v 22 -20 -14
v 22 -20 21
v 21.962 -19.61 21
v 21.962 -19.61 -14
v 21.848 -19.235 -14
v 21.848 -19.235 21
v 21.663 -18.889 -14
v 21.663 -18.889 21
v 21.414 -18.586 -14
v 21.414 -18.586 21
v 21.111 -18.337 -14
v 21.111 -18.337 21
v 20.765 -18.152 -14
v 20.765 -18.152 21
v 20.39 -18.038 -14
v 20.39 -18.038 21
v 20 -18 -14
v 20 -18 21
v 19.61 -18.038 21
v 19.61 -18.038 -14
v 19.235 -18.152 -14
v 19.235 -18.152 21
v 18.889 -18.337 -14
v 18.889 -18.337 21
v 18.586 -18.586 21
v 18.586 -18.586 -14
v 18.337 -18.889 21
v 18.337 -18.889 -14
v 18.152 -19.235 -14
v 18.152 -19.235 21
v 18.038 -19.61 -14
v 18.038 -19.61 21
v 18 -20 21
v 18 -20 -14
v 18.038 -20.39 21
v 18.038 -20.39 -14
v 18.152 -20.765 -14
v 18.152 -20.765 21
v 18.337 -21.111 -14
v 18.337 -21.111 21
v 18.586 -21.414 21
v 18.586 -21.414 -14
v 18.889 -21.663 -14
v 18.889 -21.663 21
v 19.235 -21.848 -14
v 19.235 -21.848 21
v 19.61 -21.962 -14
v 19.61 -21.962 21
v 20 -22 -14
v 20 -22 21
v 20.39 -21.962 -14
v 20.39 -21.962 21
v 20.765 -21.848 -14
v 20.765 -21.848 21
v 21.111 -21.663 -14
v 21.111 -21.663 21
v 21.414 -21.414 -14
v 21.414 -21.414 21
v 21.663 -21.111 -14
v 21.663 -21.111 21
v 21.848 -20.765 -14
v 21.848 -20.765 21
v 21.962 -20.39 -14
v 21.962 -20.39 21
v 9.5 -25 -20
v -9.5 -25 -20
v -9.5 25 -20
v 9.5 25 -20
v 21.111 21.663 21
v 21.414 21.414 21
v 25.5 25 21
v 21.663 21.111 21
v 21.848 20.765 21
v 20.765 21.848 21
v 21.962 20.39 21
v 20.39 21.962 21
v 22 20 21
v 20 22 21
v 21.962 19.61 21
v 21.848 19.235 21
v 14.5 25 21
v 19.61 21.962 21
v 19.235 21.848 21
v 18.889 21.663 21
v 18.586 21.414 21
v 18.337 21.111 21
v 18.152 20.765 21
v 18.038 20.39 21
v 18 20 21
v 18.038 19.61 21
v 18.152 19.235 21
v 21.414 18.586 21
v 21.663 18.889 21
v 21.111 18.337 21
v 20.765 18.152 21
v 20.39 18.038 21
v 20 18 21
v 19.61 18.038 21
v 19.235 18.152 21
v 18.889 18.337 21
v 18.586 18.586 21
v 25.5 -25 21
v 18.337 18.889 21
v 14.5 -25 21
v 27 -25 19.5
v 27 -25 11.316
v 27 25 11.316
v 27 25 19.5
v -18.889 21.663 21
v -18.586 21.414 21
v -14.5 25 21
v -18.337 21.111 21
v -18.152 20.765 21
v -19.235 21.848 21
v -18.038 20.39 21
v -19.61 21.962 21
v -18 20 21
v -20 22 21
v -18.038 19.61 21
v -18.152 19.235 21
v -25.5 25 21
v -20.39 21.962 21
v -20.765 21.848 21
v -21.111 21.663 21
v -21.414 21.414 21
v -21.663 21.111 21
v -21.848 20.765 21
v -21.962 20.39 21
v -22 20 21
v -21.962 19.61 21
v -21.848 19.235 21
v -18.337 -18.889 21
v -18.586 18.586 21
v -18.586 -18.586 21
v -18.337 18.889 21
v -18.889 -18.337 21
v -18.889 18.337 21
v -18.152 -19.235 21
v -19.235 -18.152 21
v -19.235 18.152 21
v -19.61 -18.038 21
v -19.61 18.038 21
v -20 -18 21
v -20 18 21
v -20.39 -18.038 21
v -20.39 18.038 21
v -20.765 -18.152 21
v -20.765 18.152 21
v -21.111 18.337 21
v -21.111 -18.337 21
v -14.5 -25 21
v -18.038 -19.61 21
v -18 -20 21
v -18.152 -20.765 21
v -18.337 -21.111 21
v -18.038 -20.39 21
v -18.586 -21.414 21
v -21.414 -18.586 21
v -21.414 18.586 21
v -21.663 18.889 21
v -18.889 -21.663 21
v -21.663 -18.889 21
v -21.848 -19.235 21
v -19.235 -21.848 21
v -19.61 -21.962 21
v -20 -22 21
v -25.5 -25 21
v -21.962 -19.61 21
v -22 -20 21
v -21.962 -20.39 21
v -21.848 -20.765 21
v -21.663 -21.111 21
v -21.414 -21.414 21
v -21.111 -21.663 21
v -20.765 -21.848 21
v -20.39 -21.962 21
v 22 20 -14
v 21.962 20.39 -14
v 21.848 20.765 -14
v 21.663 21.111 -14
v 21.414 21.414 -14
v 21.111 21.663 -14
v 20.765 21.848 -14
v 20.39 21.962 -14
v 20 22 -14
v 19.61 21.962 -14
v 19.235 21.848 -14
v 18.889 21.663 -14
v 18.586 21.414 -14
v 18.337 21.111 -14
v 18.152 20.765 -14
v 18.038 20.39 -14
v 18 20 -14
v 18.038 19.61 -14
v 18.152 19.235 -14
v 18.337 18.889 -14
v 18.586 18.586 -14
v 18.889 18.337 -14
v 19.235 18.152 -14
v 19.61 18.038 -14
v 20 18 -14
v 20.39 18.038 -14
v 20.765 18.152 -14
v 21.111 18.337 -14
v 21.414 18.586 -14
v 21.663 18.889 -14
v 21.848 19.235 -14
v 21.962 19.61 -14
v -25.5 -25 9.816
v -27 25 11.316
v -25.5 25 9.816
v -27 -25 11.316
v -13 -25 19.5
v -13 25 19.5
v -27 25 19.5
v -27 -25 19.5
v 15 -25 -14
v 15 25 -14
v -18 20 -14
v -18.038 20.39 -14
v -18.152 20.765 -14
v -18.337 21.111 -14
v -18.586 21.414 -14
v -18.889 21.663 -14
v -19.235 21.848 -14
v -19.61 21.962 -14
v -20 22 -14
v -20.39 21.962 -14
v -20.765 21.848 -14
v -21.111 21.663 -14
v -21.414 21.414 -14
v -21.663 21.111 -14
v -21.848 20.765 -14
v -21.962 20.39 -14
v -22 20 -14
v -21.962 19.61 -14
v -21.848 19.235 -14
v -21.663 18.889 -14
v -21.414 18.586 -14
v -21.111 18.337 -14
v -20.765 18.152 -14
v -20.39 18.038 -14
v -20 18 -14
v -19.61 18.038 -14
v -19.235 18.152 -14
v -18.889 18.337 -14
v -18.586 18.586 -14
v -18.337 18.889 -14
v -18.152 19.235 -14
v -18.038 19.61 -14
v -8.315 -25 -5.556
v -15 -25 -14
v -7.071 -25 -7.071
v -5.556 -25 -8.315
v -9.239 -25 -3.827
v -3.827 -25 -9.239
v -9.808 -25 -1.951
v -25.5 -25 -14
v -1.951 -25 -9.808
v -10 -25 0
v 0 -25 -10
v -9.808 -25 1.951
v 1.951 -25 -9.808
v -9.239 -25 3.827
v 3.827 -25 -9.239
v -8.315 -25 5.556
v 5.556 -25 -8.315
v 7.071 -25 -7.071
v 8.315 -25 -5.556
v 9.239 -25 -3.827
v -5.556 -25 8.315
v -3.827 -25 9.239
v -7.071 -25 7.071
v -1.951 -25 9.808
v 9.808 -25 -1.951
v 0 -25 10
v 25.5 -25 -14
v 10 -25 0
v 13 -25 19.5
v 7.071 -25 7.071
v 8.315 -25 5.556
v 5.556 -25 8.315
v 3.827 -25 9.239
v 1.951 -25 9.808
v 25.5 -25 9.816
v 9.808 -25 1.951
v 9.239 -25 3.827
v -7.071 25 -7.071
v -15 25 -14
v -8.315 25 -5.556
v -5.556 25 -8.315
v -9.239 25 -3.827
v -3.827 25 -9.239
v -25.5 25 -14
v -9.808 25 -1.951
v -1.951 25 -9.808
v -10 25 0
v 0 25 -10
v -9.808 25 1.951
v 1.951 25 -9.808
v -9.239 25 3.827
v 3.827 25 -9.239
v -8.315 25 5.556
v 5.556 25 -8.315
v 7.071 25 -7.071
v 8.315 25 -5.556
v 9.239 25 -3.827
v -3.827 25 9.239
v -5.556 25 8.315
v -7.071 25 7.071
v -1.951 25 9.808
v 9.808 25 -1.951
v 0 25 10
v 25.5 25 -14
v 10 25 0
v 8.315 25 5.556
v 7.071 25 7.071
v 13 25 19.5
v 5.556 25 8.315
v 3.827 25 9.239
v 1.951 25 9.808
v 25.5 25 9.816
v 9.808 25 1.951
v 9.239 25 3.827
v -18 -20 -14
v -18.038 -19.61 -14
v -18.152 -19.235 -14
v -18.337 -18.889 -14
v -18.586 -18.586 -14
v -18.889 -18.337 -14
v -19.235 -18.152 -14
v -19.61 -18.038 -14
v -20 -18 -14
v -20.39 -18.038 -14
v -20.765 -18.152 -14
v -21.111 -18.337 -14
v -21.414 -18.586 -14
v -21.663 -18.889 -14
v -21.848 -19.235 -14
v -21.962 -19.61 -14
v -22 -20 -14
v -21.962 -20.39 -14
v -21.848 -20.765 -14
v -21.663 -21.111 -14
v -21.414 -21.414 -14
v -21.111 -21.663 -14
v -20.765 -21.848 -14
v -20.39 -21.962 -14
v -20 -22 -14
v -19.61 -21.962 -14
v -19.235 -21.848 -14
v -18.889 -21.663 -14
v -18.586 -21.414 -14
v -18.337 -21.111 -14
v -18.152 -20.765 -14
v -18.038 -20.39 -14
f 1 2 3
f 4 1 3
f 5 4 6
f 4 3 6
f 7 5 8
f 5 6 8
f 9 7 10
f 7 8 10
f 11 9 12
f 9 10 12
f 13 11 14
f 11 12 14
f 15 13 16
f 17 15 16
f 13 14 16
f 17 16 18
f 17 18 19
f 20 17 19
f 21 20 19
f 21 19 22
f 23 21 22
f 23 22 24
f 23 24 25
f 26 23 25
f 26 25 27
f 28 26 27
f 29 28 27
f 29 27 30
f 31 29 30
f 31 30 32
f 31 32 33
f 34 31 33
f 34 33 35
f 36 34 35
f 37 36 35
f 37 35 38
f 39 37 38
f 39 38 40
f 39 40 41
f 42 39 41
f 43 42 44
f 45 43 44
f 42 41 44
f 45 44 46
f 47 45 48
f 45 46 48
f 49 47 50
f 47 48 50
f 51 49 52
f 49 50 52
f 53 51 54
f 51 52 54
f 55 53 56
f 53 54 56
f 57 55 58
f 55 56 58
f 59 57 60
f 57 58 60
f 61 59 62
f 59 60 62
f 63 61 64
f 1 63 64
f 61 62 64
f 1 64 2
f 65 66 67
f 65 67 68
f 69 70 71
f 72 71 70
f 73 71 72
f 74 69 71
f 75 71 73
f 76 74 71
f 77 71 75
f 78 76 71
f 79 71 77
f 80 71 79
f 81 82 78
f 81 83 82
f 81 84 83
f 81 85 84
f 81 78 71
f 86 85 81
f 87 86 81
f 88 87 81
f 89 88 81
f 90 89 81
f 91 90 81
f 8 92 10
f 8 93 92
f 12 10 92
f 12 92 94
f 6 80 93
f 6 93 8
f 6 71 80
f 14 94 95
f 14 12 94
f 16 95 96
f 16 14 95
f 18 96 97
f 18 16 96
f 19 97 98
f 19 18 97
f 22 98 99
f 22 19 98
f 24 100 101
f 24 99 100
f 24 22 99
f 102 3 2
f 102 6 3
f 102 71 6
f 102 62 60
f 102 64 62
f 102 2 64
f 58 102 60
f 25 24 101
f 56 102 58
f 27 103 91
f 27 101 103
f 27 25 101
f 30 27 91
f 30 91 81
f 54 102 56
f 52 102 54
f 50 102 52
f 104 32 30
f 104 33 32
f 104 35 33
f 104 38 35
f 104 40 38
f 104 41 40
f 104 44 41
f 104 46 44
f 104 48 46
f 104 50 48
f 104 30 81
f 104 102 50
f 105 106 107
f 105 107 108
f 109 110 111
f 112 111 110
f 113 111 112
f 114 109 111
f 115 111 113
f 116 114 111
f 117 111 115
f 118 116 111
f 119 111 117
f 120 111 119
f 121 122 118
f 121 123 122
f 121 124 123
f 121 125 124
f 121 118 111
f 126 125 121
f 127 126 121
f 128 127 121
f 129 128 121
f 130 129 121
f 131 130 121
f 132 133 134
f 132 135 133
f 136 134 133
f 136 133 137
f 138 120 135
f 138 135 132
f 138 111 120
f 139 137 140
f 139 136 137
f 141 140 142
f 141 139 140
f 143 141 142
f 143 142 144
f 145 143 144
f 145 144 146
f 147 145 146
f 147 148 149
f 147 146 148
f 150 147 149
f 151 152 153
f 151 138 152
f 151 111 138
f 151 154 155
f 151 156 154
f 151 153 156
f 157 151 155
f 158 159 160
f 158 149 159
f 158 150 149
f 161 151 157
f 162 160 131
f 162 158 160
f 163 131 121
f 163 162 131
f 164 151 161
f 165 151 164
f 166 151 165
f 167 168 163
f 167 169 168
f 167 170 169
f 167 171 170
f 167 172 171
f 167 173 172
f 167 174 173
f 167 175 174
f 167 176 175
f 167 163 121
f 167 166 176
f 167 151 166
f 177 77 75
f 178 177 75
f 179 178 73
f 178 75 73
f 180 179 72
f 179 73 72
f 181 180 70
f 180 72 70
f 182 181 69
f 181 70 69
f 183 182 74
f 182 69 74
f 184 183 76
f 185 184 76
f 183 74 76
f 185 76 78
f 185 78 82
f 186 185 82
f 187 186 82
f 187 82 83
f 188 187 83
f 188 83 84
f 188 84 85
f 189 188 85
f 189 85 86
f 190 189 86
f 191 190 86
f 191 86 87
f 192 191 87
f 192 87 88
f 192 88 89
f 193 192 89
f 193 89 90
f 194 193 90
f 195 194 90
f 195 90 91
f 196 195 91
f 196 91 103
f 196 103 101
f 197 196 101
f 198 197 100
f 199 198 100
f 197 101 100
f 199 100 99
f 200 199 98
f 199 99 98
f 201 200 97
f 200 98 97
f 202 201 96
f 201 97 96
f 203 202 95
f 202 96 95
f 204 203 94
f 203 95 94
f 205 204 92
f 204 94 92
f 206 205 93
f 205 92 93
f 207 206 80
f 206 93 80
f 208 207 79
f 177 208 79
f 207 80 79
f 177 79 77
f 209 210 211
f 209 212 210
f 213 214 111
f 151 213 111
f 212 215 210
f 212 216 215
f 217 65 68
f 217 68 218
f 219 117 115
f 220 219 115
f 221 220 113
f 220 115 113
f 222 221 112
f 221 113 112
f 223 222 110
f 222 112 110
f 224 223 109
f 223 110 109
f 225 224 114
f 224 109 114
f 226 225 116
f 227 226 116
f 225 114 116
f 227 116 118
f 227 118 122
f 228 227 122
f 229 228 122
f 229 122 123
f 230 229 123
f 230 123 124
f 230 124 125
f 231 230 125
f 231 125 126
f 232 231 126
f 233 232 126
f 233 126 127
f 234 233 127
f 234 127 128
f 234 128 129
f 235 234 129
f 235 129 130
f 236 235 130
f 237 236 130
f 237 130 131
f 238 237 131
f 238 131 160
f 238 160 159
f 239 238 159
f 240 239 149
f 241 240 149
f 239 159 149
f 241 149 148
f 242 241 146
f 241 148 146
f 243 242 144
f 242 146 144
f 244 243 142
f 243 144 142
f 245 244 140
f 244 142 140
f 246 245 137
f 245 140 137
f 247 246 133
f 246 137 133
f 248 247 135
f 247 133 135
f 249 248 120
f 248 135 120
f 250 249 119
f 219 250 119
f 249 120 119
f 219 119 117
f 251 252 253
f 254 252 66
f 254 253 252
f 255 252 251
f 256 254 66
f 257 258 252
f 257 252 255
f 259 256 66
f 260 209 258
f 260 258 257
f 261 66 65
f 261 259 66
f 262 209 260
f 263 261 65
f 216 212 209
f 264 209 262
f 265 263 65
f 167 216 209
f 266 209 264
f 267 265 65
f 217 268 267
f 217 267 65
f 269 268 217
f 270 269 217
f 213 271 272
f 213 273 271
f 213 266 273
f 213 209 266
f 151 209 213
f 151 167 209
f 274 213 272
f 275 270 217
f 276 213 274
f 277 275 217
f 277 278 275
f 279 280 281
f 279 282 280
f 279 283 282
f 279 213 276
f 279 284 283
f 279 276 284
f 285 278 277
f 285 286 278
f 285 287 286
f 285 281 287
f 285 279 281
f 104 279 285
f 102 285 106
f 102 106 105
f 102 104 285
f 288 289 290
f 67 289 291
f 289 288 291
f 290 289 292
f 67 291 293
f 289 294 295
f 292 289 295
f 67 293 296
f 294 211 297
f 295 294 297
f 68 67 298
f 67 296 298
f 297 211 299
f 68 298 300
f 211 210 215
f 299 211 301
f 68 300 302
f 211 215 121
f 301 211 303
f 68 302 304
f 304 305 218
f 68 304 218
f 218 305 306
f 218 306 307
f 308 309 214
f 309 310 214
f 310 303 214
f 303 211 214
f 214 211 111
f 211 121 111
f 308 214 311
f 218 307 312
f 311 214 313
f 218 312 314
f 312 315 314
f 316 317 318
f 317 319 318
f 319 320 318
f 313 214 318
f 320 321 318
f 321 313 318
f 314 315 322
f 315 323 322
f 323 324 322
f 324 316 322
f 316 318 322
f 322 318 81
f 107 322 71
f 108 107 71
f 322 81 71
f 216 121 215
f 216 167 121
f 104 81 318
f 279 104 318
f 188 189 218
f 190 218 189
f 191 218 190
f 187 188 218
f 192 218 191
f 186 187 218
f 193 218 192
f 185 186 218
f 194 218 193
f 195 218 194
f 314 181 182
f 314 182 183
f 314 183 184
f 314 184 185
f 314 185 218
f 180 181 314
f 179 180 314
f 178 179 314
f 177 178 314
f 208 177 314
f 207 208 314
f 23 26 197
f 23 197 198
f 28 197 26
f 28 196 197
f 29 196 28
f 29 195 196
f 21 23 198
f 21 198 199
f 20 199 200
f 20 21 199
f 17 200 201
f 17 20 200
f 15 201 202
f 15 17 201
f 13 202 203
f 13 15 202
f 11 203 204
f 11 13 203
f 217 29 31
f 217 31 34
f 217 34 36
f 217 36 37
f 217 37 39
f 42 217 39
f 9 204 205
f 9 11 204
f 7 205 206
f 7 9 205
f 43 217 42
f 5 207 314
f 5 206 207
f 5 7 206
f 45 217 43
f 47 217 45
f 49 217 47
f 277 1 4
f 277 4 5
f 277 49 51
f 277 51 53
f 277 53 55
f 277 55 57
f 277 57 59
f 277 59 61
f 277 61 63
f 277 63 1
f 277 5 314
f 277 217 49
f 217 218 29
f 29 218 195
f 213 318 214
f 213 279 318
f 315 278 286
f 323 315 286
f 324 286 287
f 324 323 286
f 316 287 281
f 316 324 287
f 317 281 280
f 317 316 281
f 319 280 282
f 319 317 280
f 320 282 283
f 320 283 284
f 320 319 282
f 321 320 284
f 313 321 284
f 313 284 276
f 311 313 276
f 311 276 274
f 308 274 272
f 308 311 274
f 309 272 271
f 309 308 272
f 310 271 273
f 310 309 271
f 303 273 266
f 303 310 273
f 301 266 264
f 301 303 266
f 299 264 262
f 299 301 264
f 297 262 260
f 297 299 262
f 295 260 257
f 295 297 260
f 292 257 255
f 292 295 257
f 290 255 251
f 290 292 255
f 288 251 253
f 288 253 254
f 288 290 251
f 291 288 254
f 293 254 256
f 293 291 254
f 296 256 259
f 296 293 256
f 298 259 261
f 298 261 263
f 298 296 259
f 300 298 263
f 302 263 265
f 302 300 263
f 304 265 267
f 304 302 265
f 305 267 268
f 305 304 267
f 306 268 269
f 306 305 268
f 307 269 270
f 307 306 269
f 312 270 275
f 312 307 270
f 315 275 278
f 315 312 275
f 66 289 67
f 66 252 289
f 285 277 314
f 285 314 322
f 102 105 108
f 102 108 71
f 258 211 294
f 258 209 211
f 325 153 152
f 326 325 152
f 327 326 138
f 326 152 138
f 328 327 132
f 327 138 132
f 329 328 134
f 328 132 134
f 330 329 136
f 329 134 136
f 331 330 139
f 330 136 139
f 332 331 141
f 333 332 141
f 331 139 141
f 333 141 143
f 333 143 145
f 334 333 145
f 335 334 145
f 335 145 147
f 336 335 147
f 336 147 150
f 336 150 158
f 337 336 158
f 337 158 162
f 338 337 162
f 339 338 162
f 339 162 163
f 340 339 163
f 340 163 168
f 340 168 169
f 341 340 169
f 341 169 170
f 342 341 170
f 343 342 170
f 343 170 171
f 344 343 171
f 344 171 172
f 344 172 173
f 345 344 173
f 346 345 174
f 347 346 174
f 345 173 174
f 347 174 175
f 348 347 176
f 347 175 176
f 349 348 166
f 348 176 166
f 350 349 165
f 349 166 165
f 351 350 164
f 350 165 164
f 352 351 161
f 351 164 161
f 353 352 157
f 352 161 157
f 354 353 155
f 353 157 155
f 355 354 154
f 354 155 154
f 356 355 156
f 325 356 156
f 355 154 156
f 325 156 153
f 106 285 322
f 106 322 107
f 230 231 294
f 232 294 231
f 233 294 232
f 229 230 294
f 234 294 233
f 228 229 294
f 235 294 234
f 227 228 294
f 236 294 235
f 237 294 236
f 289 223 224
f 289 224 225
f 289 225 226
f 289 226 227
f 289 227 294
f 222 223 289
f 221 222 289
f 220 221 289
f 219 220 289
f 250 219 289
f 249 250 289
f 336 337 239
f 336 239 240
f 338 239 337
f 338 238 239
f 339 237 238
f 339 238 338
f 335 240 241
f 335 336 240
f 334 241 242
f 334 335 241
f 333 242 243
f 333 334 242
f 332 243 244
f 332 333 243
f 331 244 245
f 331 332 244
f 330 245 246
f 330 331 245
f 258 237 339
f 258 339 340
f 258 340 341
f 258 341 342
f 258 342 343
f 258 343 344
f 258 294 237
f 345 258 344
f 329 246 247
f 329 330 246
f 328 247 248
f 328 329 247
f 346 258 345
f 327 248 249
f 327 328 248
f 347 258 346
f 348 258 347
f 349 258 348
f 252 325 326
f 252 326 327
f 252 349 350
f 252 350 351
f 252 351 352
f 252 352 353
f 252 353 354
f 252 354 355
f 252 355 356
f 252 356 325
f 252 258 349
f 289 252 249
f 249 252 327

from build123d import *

# Parameters (mm, degrees)
F0_R     = 10
F1_DEPTH = 25
F2_R     = 2
F3_DEPTH = 40


with BuildPart() as f1:
    # F0 (on Front) → F1 (new body, symmetric)
    with BuildSketch(Plane.XZ):
        Polygon((-15, -14), (-9.5, -20), (9.5, -20), (15, -14), (25.5, -14), (25.5, 9.815577), (27, 11.315577), (27, 19.5), (25.5, 21), (14.5, 21), (13, 19.5), (-13, 19.5), (-14.5, 21), (-25.5, 21), (-27, 19.5), (-27, 11.315577), (-25.5, 9.815577), (-25.5, -14), align=None)
        Circle(F0_R, mode=Mode.SUBTRACT)
    extrude(amount=F1_DEPTH, both=True)

    # F2 (on face) → F3 (cut)
    with BuildSketch(Plane.XY.offset(21)):
        with Locations((-20, 20)):
            Circle(F2_R)
        with Locations((20, 20)):
            Circle(F2_R)
        with Locations((20, -20)):
            Circle(F2_R)
        with Locations((-20, -20)):
            Circle(F2_R)
    extrude(amount=-F3_DEPTH, mode=Mode.SUBTRACT)


solid = f1.part
